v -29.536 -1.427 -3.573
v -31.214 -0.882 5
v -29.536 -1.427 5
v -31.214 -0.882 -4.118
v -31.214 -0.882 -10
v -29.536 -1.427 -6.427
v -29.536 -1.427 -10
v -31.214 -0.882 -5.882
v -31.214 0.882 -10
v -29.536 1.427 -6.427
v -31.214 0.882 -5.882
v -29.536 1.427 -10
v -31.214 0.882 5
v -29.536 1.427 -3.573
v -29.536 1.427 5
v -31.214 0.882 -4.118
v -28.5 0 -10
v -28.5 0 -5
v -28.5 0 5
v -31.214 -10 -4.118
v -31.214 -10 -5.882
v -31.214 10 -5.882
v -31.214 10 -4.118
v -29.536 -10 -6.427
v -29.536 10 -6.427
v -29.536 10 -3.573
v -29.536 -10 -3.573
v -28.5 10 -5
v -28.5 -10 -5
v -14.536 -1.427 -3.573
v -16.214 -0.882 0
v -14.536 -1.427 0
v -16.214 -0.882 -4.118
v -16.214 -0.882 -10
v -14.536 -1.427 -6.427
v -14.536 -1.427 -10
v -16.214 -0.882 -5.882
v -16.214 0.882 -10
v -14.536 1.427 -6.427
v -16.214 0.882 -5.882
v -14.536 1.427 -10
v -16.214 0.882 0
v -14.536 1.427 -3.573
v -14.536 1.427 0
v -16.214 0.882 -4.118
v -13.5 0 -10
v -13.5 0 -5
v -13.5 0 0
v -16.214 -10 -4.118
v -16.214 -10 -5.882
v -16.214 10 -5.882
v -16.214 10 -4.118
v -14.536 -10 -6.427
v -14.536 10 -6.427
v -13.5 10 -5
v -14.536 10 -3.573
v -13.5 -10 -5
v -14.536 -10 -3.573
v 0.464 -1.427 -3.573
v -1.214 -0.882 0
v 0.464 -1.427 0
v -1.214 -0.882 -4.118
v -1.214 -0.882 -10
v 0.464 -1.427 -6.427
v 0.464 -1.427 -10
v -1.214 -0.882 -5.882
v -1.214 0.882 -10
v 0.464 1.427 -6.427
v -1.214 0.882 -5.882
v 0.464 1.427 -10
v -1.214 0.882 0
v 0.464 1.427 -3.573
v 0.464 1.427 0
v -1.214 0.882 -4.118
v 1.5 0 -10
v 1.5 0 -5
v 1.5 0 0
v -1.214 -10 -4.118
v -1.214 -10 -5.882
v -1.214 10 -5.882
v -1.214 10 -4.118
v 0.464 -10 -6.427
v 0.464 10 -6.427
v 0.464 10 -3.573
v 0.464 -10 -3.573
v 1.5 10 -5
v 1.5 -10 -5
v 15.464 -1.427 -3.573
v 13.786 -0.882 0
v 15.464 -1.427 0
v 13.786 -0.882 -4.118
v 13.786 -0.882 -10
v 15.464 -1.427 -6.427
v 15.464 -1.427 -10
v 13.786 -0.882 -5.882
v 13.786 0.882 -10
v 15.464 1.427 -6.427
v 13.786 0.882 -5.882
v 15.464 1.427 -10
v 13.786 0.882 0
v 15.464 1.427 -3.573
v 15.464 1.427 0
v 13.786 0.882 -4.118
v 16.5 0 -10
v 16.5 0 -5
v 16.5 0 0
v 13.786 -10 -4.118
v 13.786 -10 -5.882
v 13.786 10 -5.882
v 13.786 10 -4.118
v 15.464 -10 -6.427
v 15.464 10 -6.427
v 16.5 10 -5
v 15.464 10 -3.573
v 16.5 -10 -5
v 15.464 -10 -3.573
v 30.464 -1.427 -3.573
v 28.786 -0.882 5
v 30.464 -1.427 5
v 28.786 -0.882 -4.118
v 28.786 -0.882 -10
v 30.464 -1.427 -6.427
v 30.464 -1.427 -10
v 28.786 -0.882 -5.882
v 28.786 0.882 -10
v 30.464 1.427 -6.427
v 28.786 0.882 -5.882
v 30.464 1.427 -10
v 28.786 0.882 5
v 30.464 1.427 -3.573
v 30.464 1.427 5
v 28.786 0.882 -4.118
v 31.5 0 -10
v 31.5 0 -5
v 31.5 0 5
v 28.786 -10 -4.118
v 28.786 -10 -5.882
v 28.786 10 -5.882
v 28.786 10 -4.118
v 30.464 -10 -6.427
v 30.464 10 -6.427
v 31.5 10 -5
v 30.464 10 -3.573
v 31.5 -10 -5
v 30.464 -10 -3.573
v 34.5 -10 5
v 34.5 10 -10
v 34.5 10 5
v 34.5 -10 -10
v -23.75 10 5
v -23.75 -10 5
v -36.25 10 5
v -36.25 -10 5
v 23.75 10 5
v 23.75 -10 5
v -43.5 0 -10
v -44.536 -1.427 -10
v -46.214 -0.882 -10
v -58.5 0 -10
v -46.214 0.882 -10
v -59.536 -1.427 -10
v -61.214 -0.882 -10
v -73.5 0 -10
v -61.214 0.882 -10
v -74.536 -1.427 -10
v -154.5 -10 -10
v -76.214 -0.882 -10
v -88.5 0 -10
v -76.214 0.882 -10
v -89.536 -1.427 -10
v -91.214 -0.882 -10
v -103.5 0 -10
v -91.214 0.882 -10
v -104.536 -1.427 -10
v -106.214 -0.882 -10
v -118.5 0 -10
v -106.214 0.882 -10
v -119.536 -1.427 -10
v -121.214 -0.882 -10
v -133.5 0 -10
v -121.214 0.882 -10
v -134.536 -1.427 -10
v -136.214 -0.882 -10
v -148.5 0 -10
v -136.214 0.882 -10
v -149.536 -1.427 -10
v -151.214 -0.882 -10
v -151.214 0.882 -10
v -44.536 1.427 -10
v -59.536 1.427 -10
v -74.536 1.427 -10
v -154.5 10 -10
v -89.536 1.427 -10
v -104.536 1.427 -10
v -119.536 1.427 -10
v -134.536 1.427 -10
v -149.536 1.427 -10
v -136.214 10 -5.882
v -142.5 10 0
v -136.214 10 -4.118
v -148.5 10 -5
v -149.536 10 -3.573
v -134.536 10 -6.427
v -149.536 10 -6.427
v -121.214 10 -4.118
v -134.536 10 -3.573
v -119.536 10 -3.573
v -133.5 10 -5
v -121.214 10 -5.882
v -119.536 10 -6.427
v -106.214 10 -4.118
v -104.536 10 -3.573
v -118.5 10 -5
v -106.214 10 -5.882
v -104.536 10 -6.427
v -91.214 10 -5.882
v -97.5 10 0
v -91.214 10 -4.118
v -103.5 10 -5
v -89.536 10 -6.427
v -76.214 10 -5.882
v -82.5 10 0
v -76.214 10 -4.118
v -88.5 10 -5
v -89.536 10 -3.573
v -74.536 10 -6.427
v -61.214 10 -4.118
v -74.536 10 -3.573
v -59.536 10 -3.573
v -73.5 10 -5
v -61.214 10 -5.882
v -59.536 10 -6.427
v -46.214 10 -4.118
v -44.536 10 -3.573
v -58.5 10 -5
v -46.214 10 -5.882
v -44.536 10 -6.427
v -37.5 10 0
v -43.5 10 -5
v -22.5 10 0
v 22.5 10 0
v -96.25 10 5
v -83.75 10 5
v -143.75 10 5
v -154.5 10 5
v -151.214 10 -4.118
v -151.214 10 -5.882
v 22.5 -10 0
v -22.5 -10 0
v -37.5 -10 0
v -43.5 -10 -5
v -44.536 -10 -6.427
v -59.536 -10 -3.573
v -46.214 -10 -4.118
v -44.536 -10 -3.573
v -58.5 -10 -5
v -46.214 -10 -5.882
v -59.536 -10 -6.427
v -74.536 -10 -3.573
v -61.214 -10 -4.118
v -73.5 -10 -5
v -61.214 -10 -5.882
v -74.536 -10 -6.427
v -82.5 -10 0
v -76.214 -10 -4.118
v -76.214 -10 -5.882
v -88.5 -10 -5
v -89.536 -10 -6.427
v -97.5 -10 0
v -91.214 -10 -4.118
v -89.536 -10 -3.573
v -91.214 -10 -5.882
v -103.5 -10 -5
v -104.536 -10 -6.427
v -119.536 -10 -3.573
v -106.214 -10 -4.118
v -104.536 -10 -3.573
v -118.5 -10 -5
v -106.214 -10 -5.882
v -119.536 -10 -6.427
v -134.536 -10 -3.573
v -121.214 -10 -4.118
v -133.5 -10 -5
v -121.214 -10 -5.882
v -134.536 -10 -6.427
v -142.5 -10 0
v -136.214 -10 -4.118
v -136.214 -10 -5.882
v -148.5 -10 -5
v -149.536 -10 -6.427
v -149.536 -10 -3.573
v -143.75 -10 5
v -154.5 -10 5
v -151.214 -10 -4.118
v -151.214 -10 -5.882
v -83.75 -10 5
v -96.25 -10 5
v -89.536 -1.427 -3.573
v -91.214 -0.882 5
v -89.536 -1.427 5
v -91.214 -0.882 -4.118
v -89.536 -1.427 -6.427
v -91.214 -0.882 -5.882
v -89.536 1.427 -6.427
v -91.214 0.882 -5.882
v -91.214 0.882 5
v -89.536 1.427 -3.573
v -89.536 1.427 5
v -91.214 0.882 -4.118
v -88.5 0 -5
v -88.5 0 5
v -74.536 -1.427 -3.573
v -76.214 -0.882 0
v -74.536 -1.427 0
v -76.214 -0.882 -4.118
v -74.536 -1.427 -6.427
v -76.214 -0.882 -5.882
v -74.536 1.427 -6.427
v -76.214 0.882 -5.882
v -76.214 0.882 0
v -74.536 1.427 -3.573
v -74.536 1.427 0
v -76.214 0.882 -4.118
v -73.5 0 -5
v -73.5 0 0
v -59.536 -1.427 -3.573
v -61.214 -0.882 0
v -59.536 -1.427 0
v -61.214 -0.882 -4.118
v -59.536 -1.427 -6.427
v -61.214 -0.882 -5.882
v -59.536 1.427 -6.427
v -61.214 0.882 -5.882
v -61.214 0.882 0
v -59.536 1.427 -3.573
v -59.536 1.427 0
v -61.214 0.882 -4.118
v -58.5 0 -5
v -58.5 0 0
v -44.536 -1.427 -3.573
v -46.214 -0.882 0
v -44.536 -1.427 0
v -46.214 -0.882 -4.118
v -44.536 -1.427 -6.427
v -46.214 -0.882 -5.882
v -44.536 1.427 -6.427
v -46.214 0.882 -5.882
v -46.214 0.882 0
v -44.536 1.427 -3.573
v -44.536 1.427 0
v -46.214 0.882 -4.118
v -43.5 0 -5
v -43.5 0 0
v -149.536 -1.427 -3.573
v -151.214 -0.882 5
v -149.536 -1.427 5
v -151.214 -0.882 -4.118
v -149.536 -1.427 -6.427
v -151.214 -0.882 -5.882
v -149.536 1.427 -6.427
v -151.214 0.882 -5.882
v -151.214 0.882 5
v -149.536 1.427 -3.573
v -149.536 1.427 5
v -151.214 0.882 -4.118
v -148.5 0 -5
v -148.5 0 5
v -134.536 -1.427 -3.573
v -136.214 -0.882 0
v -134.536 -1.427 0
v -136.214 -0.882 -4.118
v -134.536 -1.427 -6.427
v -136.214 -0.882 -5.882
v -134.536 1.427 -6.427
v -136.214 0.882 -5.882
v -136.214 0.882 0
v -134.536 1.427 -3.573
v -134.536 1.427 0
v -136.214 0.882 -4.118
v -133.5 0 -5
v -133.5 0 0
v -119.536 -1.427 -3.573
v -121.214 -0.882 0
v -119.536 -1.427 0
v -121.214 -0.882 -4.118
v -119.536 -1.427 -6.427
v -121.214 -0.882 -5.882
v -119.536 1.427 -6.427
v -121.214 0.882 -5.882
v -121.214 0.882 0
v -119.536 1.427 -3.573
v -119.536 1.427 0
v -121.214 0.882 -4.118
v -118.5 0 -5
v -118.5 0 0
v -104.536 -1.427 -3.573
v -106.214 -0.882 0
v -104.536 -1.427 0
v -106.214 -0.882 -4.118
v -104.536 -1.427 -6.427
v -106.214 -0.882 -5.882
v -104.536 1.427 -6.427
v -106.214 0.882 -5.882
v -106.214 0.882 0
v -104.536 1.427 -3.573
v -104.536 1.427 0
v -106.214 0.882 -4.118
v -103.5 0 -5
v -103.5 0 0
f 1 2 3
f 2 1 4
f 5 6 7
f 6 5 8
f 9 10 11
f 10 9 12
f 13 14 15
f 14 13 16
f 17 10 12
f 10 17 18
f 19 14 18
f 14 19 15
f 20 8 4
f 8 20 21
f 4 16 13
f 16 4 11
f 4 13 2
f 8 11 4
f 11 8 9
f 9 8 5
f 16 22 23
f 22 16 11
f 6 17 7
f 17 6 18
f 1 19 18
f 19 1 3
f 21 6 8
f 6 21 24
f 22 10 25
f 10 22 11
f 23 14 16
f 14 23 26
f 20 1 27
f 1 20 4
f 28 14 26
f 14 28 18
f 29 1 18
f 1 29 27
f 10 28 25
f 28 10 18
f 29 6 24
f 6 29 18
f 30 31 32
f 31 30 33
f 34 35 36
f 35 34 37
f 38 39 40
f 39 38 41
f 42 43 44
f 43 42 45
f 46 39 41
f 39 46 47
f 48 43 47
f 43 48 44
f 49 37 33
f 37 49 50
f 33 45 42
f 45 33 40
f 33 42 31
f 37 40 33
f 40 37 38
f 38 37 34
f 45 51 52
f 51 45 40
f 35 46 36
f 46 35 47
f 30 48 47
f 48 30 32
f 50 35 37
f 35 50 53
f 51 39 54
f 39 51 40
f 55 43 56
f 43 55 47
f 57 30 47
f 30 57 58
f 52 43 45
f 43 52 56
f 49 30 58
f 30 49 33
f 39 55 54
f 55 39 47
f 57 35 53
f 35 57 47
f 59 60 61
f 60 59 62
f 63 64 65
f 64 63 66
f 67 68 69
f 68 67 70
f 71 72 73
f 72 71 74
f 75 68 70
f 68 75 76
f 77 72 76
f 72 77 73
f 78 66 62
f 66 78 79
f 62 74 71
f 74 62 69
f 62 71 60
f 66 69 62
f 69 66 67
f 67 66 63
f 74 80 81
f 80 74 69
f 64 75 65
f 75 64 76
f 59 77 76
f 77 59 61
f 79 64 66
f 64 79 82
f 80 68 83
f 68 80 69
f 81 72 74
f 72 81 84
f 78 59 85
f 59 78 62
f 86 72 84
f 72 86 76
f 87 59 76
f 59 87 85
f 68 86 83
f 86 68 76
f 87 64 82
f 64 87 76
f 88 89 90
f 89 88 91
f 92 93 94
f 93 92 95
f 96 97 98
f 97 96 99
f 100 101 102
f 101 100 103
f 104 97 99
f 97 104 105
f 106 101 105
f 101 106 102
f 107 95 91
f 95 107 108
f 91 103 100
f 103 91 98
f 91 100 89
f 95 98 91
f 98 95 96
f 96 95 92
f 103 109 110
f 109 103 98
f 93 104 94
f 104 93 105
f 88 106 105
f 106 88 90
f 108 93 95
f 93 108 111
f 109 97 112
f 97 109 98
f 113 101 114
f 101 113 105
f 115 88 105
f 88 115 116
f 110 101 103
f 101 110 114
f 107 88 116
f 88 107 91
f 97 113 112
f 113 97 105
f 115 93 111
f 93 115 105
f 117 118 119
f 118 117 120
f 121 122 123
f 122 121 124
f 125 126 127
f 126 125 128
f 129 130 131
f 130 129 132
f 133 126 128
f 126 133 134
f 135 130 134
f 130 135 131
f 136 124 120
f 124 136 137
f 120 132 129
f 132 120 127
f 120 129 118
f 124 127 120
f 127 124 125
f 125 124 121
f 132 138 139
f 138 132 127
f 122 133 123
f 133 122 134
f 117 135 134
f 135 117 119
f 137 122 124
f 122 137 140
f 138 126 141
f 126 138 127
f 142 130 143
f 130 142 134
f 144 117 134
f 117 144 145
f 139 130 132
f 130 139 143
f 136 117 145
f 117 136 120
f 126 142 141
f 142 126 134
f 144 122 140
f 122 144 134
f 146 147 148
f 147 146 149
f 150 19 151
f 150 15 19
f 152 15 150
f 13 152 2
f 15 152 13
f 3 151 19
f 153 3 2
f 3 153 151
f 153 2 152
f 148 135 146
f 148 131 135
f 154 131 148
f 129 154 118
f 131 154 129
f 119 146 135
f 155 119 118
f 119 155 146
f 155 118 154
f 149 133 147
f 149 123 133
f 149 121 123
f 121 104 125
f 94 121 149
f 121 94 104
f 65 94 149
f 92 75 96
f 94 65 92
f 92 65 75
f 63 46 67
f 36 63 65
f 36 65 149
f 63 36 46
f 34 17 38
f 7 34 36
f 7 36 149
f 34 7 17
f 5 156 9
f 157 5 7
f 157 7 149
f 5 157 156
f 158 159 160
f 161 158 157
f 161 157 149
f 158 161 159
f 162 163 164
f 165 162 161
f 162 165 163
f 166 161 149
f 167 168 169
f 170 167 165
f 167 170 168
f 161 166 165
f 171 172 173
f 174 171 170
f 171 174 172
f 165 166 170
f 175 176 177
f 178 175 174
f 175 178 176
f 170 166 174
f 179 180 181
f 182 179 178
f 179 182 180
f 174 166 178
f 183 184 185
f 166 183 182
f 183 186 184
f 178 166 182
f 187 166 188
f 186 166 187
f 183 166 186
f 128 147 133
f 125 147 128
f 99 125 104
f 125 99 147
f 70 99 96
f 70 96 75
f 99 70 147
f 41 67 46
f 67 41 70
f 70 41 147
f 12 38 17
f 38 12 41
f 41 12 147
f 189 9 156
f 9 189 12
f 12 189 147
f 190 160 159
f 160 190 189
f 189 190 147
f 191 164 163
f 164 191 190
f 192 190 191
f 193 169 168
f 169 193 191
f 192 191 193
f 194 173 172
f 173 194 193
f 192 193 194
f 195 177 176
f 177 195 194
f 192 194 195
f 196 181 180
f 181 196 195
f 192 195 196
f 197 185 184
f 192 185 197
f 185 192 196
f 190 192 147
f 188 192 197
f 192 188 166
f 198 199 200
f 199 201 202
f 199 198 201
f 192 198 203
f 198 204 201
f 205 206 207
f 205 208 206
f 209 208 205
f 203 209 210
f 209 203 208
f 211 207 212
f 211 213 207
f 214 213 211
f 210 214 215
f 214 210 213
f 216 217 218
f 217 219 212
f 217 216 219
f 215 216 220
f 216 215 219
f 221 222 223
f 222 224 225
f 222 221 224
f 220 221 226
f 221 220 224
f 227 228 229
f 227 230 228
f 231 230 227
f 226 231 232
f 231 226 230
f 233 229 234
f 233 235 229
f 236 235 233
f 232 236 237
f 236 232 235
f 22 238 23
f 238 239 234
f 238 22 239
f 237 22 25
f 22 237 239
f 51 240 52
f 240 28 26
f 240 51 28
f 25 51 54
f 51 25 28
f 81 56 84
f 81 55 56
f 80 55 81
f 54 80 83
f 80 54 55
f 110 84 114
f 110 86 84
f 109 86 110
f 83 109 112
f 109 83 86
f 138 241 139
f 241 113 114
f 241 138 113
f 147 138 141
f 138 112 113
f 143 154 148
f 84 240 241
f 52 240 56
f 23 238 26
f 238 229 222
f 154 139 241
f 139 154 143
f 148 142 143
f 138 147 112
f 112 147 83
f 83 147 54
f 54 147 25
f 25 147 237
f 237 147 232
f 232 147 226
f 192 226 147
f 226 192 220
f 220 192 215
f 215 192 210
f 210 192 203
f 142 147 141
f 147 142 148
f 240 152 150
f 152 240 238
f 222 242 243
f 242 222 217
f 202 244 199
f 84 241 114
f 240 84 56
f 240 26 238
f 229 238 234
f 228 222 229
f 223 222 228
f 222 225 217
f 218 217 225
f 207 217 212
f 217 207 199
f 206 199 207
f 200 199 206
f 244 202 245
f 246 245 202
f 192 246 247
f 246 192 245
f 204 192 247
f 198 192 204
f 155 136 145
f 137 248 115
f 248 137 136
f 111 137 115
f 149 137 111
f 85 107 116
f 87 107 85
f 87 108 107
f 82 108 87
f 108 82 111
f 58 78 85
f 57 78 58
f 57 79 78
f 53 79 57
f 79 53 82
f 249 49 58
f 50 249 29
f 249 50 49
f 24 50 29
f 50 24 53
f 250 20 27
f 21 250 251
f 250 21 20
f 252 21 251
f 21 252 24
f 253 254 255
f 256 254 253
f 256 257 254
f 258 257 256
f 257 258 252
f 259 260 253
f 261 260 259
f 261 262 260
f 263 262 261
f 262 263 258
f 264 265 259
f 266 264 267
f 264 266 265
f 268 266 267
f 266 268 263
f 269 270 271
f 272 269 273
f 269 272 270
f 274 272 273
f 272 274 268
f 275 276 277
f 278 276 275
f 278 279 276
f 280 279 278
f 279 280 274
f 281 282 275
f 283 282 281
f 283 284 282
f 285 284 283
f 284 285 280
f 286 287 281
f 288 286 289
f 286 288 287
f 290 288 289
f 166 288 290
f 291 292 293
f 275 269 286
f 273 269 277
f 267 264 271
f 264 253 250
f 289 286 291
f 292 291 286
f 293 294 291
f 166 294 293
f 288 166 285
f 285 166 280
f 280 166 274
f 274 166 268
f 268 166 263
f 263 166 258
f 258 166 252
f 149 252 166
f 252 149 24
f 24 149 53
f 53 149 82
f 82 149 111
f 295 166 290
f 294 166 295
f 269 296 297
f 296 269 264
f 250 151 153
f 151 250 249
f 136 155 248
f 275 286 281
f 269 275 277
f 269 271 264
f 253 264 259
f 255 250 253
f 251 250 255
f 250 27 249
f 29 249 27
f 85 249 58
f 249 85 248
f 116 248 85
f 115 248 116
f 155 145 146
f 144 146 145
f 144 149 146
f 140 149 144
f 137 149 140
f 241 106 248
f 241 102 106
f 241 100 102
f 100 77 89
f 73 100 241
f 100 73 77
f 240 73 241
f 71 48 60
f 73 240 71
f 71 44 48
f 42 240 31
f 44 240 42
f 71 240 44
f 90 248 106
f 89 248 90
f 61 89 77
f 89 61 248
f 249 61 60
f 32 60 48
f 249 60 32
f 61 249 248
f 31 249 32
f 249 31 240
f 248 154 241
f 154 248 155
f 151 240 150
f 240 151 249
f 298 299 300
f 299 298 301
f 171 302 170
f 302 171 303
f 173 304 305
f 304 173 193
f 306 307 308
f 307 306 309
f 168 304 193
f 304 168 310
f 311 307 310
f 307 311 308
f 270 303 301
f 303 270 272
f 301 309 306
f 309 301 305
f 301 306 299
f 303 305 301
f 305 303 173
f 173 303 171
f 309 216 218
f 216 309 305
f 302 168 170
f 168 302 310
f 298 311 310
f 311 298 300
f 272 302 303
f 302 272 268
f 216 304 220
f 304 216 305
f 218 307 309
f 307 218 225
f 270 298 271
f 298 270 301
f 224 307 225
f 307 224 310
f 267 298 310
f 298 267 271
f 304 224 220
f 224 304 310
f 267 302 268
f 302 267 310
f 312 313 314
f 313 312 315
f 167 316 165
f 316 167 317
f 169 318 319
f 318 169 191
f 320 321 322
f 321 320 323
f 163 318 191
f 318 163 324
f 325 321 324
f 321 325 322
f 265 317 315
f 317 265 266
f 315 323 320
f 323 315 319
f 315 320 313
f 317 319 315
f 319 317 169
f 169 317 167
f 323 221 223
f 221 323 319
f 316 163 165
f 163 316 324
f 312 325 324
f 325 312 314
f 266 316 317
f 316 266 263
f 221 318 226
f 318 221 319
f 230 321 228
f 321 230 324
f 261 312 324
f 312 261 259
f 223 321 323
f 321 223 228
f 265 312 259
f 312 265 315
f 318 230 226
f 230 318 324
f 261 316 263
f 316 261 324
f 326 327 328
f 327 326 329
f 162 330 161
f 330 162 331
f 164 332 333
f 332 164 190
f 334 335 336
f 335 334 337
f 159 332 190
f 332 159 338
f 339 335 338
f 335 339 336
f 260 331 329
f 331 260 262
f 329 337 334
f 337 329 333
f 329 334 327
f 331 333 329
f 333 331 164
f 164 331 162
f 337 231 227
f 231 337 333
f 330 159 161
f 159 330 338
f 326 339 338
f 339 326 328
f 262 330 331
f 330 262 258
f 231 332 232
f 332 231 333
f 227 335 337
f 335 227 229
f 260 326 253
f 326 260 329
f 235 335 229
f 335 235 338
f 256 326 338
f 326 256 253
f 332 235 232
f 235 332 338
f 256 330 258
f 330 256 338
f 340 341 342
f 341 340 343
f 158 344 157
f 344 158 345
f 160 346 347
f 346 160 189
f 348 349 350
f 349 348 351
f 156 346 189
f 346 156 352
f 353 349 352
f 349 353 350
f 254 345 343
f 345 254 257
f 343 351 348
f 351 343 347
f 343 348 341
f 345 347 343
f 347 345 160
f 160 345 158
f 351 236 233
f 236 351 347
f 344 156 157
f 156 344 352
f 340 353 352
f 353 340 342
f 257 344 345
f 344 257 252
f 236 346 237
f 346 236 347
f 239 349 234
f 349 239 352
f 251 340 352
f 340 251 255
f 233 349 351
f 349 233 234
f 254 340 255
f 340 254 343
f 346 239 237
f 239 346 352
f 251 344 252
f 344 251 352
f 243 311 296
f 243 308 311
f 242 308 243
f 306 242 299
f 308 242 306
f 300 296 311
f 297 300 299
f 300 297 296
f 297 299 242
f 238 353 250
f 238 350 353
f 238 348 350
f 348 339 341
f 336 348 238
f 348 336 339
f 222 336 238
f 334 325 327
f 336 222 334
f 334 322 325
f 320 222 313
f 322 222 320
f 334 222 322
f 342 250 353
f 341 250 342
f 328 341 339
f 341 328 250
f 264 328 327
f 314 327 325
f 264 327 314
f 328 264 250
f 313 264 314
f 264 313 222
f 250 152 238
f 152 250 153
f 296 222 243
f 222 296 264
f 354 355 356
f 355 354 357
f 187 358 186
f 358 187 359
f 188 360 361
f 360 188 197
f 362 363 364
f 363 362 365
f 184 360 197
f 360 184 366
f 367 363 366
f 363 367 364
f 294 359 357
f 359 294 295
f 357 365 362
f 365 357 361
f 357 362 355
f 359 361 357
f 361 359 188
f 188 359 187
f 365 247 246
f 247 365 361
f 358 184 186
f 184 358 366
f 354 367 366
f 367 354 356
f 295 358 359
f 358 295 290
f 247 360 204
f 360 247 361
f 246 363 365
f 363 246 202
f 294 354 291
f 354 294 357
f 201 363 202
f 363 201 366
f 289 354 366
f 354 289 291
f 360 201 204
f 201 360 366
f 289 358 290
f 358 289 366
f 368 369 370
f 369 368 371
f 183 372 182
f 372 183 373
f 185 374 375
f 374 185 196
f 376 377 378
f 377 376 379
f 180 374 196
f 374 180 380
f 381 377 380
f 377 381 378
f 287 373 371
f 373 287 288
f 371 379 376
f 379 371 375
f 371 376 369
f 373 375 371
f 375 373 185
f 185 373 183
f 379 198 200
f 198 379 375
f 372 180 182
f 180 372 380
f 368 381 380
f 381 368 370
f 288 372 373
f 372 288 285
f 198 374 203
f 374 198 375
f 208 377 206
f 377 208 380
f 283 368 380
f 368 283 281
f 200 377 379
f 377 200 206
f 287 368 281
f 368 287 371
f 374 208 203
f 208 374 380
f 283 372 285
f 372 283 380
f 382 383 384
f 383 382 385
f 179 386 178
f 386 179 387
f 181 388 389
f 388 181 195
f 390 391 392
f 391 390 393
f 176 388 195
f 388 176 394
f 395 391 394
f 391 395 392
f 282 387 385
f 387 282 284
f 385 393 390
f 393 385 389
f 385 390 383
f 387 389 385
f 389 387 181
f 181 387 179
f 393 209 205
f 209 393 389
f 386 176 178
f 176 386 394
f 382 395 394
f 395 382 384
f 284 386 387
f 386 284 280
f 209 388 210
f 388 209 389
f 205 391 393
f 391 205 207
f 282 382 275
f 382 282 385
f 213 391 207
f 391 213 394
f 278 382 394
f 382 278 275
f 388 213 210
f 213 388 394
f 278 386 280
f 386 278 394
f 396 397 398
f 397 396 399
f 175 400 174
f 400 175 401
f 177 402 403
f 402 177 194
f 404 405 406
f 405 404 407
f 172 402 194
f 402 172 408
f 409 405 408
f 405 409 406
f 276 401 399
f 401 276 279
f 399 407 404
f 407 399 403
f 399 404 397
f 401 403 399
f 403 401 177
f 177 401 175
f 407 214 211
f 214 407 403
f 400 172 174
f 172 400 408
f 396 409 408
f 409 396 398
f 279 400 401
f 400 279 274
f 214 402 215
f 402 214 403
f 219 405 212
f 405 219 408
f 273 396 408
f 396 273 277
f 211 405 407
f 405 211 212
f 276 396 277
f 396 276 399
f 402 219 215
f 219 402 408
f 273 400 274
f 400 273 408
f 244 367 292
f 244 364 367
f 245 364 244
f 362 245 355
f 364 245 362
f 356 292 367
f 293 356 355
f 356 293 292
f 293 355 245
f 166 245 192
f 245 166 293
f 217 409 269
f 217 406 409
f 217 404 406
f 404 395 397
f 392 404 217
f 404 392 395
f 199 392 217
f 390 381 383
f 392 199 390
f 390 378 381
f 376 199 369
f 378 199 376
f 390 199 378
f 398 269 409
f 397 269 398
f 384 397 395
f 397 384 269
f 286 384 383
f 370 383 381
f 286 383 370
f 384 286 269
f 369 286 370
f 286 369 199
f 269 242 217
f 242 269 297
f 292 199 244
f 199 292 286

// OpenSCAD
// file: tote.scad
include <config.scad>;

module tote() {
  hull() {
    translate([0, 0, toteHeight/2])
      cube([toteBottomWidth, toteBottomLength, toteHeight], center = true);
    translate([0, 0, toteHeight -e/2])
      cube([toteTopWidth, toteTopLength, e], center = true);
  }
}

module totes() {
  for (x = [0:(totesPerRow-1)])
    translate([-x*toteTopWidth, 0, 0])
      scale(0.99)
        tote();
}

tote();
// file: config.scad
e = 0.01;

// Real Sterilite Tote Size
//toteHeight = 125;
//toteTopWidth = 200;
//toteBottomWidth = 155;
//toteTopLength = 355;
//toteBottomLength = 300;

// Scaled Size
toteHeight = 30;
toteTopWidth = 60;
toteBottomWidth = 45;
toteTopLength = 105;
toteBottomLength = 90;

// Parameters
fingerHeight = 5;
fingerClearance = 5;

armatureHeight = 10;
armatureThickness = 20;

baseHeight = 20;
baseThickness = 10;

boltDiameter = 3;
pinDiameter = 4;

base2Height = 20;

totesPerRow = 3;
// main file
include <config.scad>;
use <tote.scad>;

module pickup_piece() {
  difference() {
    translate([0, 0, (fingerHeight + armatureHeight)/2 - armatureHeight])
      cube([toteTopWidth + boltDiameter*3, armatureThickness, fingerHeight + armatureHeight], center = true);
    tote();
    for (x = [-1, -0.5, 0, 0.5, 1])
      translate([x*toteTopWidth/2, 0, -armatureHeight/2]) {
        cylinder(d = boltDiameter, h = armatureThickness + fingerHeight + 1, center = true);
        rotate([90, 0, 0])
          cylinder(d = boltDiameter, h = armatureThickness + 1, center = true);
      }
  }
}

module pickup() {
  for (x = [0:(totesPerRow-1)])
    translate([-x*toteTopWidth, 0, 0])
      pickup_piece();
}

pickup();
